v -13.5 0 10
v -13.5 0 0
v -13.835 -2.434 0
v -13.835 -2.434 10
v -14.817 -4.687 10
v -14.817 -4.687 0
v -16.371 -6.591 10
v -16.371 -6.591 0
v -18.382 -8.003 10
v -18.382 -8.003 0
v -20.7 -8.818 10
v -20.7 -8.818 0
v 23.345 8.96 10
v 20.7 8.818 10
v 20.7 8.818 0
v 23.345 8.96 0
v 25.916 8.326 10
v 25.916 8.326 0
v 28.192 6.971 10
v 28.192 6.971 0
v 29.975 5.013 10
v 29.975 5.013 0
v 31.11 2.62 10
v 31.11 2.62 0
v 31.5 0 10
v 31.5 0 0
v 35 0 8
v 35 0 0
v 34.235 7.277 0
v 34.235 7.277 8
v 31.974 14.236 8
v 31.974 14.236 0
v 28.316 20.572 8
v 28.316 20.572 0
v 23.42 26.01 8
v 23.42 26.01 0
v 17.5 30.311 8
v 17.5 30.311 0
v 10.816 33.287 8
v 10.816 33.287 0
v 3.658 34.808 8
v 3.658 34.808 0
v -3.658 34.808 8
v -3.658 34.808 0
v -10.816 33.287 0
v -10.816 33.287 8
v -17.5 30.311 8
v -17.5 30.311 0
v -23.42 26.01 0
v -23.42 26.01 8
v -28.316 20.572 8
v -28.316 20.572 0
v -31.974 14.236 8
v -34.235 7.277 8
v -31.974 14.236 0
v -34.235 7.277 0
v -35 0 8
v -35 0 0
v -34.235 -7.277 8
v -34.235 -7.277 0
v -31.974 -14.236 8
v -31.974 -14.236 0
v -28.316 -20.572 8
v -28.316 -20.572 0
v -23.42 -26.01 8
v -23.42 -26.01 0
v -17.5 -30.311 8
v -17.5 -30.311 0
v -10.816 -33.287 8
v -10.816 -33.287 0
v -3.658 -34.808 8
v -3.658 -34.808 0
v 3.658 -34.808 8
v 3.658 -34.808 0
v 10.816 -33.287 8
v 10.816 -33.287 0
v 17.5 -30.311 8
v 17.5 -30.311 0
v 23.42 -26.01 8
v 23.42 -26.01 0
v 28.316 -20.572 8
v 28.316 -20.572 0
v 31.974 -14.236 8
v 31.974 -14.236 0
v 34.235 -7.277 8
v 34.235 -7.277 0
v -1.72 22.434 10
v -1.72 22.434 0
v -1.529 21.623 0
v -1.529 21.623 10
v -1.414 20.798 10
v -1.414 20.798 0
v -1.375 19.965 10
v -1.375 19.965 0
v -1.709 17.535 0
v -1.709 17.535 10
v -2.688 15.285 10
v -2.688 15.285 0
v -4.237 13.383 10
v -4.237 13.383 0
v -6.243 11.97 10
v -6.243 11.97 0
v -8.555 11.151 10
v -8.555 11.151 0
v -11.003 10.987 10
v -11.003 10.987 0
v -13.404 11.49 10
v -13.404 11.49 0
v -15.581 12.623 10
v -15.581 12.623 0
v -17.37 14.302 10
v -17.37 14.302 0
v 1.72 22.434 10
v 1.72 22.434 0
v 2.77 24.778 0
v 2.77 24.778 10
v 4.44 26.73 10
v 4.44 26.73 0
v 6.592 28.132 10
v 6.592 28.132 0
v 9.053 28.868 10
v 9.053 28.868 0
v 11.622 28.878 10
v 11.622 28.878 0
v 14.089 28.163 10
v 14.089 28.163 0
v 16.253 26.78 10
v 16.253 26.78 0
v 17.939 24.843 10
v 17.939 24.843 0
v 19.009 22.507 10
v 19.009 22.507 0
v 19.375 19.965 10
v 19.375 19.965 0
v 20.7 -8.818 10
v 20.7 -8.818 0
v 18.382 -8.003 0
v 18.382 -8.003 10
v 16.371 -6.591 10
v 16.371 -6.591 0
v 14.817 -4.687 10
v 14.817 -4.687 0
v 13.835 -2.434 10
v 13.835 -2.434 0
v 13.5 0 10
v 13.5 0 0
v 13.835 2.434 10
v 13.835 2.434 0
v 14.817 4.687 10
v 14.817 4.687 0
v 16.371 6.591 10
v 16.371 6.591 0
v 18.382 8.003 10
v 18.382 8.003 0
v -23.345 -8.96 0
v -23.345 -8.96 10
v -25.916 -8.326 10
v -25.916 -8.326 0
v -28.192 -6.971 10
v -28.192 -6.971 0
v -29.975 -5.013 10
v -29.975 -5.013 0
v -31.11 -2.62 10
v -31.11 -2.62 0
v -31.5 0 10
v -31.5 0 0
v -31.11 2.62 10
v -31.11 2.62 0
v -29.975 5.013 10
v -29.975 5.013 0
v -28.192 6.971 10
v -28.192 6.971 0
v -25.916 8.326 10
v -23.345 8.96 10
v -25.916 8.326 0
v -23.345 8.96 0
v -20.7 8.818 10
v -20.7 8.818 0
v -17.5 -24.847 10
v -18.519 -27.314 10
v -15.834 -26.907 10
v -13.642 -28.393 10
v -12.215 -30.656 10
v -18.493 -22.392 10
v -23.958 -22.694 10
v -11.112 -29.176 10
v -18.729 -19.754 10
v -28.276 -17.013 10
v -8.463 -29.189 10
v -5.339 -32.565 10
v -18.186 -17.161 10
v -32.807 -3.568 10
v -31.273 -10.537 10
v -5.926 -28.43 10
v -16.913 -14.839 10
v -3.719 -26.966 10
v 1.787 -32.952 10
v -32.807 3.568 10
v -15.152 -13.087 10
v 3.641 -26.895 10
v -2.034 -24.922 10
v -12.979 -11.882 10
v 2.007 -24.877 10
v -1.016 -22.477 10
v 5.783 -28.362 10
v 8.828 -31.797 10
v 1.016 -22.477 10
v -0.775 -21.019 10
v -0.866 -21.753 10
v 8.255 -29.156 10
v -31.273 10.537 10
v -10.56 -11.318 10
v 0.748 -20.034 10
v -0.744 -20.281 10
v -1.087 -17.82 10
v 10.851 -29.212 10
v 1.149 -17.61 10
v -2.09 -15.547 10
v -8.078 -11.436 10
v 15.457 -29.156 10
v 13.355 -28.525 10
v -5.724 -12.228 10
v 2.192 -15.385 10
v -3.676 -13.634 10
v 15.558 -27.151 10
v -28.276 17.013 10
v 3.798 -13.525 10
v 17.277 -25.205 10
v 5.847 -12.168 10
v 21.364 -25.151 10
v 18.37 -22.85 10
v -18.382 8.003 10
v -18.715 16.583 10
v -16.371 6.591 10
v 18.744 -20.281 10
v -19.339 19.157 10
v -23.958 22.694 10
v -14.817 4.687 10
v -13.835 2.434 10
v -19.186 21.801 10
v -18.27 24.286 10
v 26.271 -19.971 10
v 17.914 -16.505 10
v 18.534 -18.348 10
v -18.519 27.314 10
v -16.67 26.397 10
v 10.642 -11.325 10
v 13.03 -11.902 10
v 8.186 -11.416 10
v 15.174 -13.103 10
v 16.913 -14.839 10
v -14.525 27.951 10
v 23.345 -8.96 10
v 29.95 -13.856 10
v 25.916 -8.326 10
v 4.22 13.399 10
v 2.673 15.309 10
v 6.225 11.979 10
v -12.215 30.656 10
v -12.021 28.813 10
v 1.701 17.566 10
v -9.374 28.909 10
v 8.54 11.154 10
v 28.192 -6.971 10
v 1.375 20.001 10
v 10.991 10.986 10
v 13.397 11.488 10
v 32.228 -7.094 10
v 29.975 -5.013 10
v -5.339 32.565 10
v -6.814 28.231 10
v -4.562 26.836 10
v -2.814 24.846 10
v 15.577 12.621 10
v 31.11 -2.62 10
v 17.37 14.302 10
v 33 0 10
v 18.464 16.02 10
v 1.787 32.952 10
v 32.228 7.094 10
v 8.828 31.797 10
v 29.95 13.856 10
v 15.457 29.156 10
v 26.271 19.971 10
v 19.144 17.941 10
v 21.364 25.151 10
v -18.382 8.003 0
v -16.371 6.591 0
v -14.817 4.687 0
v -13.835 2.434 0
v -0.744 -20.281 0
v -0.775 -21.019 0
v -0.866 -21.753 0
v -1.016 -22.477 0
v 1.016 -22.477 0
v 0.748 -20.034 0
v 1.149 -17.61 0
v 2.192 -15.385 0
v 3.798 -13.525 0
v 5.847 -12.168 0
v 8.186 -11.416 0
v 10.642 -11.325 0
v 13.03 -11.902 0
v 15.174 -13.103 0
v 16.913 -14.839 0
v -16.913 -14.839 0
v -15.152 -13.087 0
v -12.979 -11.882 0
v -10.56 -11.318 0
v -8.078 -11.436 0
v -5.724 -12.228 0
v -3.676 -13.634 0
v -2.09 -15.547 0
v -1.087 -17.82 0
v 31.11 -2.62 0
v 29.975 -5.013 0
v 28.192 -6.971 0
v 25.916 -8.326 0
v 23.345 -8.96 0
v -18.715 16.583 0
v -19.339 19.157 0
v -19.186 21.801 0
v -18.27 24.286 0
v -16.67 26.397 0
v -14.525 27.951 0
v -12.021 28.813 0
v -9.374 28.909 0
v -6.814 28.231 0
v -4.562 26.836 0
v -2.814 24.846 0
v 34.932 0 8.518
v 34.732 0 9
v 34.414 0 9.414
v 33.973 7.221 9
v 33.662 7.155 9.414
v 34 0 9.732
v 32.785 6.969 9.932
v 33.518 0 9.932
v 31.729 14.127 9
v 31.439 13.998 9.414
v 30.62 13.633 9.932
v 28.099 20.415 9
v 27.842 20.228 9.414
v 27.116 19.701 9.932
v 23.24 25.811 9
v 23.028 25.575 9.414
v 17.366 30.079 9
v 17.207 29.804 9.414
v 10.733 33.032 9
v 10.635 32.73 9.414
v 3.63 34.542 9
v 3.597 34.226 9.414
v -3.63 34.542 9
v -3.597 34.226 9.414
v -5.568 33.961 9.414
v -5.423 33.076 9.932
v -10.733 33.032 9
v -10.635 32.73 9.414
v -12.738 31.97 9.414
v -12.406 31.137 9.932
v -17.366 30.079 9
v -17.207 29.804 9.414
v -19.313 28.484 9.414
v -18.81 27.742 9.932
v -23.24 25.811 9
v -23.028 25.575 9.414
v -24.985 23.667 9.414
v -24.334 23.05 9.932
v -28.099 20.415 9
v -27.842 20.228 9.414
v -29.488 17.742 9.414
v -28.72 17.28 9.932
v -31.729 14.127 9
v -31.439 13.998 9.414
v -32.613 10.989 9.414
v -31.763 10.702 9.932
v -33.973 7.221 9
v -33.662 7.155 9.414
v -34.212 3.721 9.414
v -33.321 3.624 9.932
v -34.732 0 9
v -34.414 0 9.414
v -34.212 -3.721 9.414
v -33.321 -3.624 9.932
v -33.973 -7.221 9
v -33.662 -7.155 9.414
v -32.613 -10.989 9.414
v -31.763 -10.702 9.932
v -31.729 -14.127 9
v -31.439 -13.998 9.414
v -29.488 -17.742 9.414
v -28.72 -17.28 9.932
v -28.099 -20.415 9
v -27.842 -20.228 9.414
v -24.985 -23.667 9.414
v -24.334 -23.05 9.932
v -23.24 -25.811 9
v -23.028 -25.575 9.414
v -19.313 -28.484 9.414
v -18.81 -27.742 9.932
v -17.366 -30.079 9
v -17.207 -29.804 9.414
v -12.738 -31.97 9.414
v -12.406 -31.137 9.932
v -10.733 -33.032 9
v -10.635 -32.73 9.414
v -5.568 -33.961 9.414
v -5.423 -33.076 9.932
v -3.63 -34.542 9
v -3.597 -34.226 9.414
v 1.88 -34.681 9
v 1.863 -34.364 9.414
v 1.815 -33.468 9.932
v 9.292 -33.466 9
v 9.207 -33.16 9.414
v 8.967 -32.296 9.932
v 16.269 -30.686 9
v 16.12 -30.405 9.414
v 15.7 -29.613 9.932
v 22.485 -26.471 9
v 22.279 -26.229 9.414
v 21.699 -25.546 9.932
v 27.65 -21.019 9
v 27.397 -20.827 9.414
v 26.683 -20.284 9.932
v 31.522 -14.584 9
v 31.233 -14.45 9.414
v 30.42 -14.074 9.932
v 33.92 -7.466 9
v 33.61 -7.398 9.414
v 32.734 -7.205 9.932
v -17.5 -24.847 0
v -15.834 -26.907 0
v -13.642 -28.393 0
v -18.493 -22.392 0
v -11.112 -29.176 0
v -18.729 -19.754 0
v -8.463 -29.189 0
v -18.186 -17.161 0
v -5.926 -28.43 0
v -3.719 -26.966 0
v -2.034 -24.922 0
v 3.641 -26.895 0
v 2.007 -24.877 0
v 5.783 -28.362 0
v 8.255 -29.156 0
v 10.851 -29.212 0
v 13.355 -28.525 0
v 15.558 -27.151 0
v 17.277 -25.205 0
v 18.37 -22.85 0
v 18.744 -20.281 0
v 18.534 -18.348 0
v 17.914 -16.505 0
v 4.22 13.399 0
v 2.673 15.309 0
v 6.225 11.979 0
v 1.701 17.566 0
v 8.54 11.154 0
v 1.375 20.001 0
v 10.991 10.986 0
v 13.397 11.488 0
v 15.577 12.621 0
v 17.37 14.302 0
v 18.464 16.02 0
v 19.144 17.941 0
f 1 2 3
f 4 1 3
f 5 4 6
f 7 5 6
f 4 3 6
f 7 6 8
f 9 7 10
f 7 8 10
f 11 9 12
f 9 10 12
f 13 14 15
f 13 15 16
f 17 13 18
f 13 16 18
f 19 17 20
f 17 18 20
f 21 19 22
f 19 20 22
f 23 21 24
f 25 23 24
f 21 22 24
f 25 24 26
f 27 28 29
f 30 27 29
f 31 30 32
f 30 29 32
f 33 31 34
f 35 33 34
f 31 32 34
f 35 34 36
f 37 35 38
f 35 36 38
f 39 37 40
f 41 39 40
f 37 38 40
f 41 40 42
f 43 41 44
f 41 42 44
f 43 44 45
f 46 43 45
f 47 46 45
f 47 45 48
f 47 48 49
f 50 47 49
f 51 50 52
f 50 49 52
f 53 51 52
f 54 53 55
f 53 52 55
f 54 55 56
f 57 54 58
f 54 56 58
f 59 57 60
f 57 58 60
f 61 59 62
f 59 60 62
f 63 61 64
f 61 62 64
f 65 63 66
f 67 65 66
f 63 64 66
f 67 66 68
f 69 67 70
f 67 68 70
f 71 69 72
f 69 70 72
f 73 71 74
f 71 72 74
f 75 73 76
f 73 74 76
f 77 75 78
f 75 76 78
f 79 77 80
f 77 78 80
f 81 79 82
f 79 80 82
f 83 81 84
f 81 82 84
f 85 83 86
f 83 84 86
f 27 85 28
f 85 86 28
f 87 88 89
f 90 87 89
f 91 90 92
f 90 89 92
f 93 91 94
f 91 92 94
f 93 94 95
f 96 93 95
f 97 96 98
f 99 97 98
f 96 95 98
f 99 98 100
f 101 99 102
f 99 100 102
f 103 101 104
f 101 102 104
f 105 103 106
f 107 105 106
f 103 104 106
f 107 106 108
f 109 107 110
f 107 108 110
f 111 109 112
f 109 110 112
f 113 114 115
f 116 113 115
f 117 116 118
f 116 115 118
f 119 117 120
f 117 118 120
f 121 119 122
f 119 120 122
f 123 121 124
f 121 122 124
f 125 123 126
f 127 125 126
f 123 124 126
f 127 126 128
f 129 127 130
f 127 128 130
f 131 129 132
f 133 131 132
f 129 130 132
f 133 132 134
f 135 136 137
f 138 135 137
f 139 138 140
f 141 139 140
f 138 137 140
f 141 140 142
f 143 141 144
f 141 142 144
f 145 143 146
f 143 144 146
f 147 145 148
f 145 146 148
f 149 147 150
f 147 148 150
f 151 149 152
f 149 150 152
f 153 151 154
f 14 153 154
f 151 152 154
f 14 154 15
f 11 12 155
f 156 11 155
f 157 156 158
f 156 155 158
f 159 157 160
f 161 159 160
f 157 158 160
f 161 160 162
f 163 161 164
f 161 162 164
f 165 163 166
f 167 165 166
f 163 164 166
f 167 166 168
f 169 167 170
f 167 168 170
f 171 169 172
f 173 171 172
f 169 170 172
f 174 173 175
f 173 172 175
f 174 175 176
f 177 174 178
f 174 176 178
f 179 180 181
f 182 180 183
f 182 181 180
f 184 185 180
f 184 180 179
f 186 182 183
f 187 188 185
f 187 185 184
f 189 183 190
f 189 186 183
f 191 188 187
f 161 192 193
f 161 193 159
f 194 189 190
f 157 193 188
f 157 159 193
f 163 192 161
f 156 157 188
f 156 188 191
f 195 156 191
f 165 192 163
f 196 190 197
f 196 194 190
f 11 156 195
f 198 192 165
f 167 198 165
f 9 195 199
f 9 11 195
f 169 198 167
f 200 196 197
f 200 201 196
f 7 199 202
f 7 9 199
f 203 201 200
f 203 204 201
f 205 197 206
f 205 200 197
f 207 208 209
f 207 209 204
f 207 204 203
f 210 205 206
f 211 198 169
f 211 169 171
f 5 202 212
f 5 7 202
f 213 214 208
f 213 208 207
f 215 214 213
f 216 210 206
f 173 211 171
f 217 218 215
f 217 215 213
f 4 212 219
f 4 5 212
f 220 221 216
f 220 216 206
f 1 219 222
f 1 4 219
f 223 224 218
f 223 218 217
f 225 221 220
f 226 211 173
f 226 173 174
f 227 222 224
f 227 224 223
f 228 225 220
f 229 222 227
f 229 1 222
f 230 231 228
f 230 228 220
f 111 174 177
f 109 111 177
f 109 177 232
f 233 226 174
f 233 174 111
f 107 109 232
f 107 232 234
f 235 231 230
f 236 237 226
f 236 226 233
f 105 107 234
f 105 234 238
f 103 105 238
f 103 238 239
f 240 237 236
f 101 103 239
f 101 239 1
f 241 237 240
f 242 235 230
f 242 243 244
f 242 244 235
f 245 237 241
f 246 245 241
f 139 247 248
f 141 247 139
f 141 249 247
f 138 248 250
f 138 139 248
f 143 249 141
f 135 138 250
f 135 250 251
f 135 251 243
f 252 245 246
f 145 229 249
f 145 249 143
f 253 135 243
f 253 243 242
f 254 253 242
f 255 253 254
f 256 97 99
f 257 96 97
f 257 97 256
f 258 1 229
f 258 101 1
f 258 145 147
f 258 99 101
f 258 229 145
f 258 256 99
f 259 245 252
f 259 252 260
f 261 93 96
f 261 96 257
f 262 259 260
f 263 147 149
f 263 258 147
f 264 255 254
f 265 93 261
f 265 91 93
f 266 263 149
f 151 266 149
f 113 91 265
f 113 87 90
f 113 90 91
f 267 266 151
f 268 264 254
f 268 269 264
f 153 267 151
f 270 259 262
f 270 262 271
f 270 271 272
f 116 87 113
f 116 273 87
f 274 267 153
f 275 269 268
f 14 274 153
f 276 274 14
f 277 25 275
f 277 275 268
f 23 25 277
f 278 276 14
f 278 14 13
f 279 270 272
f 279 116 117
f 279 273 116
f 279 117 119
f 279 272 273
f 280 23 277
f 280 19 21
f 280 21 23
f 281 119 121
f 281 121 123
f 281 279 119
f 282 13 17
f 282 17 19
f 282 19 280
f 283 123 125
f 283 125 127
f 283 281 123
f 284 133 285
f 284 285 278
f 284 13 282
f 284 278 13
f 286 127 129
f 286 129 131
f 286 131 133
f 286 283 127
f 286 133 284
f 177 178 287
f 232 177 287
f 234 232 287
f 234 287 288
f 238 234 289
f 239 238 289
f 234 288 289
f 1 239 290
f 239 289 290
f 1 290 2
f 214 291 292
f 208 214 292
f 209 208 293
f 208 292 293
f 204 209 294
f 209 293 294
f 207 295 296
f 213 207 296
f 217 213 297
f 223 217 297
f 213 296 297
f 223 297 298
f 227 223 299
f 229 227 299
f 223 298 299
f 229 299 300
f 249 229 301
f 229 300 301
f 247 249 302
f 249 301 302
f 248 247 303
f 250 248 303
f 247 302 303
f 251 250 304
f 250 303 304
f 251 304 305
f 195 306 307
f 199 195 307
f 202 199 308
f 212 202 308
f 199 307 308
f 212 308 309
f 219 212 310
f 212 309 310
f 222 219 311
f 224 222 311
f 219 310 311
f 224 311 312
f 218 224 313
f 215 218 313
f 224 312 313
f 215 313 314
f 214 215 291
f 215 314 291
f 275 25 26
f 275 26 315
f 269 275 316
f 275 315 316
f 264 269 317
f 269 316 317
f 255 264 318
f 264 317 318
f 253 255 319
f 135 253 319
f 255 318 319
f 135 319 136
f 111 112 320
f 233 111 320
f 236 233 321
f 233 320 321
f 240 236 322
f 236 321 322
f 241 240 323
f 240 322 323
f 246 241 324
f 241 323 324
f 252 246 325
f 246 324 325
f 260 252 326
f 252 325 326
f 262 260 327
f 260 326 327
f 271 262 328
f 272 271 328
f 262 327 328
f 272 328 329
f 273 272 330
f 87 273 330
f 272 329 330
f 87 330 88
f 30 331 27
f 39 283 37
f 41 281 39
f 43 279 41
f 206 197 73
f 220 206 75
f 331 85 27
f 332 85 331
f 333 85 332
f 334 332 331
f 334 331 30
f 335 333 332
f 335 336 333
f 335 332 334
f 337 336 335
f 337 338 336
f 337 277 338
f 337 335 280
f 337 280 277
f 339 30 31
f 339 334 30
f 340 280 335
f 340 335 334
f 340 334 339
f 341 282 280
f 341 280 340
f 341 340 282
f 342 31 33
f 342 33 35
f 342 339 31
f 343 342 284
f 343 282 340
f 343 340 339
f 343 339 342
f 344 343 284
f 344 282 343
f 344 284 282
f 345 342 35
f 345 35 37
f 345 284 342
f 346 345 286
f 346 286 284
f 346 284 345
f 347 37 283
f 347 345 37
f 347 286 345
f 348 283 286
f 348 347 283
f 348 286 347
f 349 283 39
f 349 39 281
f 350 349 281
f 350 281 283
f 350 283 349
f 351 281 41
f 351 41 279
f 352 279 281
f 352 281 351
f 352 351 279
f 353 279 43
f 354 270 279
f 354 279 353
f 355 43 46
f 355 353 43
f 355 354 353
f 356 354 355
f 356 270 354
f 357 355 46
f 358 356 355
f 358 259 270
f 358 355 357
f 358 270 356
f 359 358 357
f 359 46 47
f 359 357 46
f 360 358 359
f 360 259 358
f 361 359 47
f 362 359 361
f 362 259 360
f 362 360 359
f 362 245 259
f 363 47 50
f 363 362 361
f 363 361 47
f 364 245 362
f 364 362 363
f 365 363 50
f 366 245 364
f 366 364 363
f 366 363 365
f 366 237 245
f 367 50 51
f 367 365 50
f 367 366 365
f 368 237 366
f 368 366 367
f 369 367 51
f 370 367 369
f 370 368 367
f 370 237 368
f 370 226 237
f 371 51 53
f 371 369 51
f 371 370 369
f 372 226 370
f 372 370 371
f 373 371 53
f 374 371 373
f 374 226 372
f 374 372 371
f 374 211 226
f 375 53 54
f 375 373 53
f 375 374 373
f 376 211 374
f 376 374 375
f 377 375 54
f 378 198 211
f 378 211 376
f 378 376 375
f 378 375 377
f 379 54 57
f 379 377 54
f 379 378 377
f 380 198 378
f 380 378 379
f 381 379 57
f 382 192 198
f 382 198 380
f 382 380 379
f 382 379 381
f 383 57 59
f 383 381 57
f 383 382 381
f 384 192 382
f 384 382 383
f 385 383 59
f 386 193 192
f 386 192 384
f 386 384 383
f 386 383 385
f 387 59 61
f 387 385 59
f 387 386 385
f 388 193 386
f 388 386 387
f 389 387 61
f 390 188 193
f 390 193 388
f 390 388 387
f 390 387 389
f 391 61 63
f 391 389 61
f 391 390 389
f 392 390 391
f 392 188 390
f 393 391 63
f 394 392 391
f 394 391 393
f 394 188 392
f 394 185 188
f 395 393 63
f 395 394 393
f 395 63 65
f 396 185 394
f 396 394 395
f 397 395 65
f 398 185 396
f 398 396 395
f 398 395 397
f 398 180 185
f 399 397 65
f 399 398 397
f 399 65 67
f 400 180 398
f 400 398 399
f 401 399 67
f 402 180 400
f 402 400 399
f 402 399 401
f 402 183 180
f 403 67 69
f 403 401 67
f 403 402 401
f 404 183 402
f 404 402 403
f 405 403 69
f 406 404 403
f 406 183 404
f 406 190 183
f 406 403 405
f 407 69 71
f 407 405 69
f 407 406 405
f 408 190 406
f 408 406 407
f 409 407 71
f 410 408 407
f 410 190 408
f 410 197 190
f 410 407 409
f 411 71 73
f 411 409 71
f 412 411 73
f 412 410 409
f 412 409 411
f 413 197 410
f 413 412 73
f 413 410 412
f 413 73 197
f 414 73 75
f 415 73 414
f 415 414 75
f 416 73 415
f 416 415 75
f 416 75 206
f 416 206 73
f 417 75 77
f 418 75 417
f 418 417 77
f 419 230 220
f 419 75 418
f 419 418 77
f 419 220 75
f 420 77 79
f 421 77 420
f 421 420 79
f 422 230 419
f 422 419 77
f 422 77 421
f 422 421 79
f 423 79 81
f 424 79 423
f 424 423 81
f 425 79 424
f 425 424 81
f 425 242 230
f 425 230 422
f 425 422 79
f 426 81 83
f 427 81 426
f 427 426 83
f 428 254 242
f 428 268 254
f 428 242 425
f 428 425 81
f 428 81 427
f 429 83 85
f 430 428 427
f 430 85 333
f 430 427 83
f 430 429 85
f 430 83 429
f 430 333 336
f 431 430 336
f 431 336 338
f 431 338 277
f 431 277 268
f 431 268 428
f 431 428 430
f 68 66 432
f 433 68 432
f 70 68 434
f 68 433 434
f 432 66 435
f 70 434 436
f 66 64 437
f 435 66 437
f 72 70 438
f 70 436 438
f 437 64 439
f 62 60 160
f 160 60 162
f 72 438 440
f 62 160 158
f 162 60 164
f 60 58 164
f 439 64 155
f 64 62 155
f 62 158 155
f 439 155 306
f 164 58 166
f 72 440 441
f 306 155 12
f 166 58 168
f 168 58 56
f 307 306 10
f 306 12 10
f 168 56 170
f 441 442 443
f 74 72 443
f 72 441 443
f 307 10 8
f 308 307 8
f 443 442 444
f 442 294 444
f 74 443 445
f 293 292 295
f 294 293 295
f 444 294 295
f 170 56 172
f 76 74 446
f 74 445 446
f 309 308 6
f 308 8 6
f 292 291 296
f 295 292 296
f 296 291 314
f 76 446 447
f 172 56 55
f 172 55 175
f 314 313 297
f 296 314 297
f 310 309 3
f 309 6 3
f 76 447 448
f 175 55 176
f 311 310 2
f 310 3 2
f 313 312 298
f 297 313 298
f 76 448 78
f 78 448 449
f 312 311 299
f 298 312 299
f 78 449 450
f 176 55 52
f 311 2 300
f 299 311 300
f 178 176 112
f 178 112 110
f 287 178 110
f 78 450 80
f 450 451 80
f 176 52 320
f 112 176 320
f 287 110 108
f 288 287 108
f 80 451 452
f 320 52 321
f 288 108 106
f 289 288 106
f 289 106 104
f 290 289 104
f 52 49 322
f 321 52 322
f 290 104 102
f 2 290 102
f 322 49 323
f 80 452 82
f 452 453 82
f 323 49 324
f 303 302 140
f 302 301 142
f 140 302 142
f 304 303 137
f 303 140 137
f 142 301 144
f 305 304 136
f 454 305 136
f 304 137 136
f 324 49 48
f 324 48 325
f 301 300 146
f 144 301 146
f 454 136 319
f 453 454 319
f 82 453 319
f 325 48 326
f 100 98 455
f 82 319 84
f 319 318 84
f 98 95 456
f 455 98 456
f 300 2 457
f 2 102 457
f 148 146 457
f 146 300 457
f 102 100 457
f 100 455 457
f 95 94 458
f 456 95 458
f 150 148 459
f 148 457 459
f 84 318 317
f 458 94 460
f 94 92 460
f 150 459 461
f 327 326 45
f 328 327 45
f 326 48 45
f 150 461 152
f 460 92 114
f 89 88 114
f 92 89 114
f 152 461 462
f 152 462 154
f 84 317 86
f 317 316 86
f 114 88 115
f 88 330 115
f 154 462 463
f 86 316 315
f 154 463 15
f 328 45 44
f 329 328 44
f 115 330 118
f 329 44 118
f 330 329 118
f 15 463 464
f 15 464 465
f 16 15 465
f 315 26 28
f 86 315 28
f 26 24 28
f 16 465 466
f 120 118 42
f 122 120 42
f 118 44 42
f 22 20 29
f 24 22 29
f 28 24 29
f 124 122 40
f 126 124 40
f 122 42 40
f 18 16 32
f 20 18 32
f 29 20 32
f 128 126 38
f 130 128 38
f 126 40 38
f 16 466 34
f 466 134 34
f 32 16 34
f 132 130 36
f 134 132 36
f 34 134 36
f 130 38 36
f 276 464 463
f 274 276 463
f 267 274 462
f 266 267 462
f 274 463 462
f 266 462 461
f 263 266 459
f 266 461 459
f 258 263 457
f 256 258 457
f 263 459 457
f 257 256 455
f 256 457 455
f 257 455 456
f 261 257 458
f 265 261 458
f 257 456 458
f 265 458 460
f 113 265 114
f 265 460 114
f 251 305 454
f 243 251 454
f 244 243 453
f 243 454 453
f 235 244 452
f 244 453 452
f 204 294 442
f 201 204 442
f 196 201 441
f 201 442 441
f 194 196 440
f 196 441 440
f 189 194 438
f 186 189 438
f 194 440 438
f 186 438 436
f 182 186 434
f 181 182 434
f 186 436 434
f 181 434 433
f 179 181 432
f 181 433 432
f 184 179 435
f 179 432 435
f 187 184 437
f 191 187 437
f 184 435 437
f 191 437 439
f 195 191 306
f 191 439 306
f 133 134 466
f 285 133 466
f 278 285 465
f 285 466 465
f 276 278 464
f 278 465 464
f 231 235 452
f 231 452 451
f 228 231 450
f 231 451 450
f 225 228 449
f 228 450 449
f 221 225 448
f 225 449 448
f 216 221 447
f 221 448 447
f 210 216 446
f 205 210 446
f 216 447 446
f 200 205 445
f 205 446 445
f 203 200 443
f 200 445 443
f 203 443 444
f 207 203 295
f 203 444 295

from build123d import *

# Parameters (mm, degrees)
F0_R     = 35
F1_DEPTH = 10
F2_R     = 2


with BuildPart() as f1:
    # F0 (on Top) → F1 (new body)
    with BuildSketch(Plane.XY):
        Circle(F0_R)
        with BuildLine():
            ThreePointArc((17.3698096203, 14.3017381376), (19.2313546065, 11.6792551132), (20.7, 8.818163074))
            ThreePointArc((20.7, 8.818163074), (28.1920997883, 6.9713700232), (31.5, 0))
            ThreePointArc((31.5, 0), (28.1920997883, -6.9713700232), (20.7, -8.818163074))
            ThreePointArc((20.7, -8.818163074), (19.045931324, -11.9792528982), (16.9129987609, -14.839153376))
            ThreePointArc((16.9129987609, -14.839153376), (18.2741398317, -17.409907743), (18.7442222222, -20.2805358234))
            ThreePointArc((18.7442222222, -20.2805358234), (10.8508683157, -29.2122397159), (1.016370128, -22.4770325391))
            ThreePointArc((1.016370128, -22.4770325391), (0, -22.5), (-1.016370128, -22.4770325391))
            ThreePointArc((-1.016370128, -22.4770325391), (-13.6419111111, -28.3927501528), (-16.9129987609, -14.839153376))
            ThreePointArc((-16.9129987609, -14.839153376), (-19.045931324, -11.9792528982), (-20.7, -8.818163074))
            ThreePointArc((-20.7, -8.818163074), (-31.5, 0), (-20.7, 8.818163074))
            ThreePointArc((-20.7, 8.818163074), (-19.2313546065, 11.6792551132), (-17.3698096203, 14.3017381376))
            ThreePointArc((-17.3698096203, 14.3017381376), (-14.5251555556, 27.951204913), (-1.7203948242, 22.4341311766))
            ThreePointArc((-1.7203948242, 22.4341311766), (0, 22.5), (1.7203948242, 22.4341311766))
            ThreePointArc((1.7203948242, 22.4341311766), (11.6216169109, 28.8784074582), (19.3751111111, 19.9651463664))
            ThreePointArc((19.3751111111, 19.9651463664), (18.8589865988, 16.9611728797), (17.3698096203, 14.3017381376))
        make_face(mode=Mode.SUBTRACT)
        with BuildLine():
            ThreePointArc((20.7, -8.818163074), (13.5, 0), (20.7, 8.818163074))
            ThreePointArc((20.7, 8.818163074), (19.2313546065, 11.6792551132), (17.3698096203, 14.3017381376))
            ThreePointArc((17.3698096203, 14.3017381376), (6.2250666667, 11.9790878198), (1.7203948242, 22.4341311766))
            ThreePointArc((1.7203948242, 22.4341311766), (0, 22.5), (-1.7203948242, 22.4341311766))
            ThreePointArc((-1.7203948242, 22.4341311766), (-1.4618500193, 21.2116521662), (-1.3751111111, 19.9651463664))
            ThreePointArc((-1.3751111111, 19.9651463664), (-7.3711376244, 11.4812708787), (-17.3698096203, 14.3017381376))
            ThreePointArc((-17.3698096203, 14.3017381376), (-19.2313546065, 11.6792551132), (-20.7, 8.818163074))
            ThreePointArc((-20.7, 8.818163074), (-15.5286299768, 5.6920997883), (-13.5, 0))
            ThreePointArc((-13.5, 0), (-15.5286299768, -5.6920997883), (-20.7, -8.818163074))
            ThreePointArc((-20.7, -8.818163074), (-19.045931324, -11.9792528982), (-16.9129987609, -14.839153376))
            ThreePointArc((-16.9129987609, -14.839153376), (-6.8735941418, -11.750618214), (-0.7442222222, -20.2805358234))
            ThreePointArc((-0.7442222222, -20.2805358234), (-0.8125183297, -21.3871819169), (-1.016370128, -22.4770325391))
            ThreePointArc((-1.016370128, -22.4770325391), (0, -22.5), (1.016370128, -22.4770325391))
            ThreePointArc((1.016370128, -22.4770325391), (5.8465333333, -12.168321494), (16.9129987609, -14.839153376))
            ThreePointArc((16.9129987609, -14.839153376), (19.045931324, -11.9792528982), (20.7, -8.818163074))
        make_face()
    extrude(amount=F1_DEPTH)

    # F2
    f2_edges = [f1.edges().sort_by_distance(p)[0] for p in [
        (-35, 0, 10),
    ]]
    fillet(f2_edges, radius=F2_R)


solid = f1.part
